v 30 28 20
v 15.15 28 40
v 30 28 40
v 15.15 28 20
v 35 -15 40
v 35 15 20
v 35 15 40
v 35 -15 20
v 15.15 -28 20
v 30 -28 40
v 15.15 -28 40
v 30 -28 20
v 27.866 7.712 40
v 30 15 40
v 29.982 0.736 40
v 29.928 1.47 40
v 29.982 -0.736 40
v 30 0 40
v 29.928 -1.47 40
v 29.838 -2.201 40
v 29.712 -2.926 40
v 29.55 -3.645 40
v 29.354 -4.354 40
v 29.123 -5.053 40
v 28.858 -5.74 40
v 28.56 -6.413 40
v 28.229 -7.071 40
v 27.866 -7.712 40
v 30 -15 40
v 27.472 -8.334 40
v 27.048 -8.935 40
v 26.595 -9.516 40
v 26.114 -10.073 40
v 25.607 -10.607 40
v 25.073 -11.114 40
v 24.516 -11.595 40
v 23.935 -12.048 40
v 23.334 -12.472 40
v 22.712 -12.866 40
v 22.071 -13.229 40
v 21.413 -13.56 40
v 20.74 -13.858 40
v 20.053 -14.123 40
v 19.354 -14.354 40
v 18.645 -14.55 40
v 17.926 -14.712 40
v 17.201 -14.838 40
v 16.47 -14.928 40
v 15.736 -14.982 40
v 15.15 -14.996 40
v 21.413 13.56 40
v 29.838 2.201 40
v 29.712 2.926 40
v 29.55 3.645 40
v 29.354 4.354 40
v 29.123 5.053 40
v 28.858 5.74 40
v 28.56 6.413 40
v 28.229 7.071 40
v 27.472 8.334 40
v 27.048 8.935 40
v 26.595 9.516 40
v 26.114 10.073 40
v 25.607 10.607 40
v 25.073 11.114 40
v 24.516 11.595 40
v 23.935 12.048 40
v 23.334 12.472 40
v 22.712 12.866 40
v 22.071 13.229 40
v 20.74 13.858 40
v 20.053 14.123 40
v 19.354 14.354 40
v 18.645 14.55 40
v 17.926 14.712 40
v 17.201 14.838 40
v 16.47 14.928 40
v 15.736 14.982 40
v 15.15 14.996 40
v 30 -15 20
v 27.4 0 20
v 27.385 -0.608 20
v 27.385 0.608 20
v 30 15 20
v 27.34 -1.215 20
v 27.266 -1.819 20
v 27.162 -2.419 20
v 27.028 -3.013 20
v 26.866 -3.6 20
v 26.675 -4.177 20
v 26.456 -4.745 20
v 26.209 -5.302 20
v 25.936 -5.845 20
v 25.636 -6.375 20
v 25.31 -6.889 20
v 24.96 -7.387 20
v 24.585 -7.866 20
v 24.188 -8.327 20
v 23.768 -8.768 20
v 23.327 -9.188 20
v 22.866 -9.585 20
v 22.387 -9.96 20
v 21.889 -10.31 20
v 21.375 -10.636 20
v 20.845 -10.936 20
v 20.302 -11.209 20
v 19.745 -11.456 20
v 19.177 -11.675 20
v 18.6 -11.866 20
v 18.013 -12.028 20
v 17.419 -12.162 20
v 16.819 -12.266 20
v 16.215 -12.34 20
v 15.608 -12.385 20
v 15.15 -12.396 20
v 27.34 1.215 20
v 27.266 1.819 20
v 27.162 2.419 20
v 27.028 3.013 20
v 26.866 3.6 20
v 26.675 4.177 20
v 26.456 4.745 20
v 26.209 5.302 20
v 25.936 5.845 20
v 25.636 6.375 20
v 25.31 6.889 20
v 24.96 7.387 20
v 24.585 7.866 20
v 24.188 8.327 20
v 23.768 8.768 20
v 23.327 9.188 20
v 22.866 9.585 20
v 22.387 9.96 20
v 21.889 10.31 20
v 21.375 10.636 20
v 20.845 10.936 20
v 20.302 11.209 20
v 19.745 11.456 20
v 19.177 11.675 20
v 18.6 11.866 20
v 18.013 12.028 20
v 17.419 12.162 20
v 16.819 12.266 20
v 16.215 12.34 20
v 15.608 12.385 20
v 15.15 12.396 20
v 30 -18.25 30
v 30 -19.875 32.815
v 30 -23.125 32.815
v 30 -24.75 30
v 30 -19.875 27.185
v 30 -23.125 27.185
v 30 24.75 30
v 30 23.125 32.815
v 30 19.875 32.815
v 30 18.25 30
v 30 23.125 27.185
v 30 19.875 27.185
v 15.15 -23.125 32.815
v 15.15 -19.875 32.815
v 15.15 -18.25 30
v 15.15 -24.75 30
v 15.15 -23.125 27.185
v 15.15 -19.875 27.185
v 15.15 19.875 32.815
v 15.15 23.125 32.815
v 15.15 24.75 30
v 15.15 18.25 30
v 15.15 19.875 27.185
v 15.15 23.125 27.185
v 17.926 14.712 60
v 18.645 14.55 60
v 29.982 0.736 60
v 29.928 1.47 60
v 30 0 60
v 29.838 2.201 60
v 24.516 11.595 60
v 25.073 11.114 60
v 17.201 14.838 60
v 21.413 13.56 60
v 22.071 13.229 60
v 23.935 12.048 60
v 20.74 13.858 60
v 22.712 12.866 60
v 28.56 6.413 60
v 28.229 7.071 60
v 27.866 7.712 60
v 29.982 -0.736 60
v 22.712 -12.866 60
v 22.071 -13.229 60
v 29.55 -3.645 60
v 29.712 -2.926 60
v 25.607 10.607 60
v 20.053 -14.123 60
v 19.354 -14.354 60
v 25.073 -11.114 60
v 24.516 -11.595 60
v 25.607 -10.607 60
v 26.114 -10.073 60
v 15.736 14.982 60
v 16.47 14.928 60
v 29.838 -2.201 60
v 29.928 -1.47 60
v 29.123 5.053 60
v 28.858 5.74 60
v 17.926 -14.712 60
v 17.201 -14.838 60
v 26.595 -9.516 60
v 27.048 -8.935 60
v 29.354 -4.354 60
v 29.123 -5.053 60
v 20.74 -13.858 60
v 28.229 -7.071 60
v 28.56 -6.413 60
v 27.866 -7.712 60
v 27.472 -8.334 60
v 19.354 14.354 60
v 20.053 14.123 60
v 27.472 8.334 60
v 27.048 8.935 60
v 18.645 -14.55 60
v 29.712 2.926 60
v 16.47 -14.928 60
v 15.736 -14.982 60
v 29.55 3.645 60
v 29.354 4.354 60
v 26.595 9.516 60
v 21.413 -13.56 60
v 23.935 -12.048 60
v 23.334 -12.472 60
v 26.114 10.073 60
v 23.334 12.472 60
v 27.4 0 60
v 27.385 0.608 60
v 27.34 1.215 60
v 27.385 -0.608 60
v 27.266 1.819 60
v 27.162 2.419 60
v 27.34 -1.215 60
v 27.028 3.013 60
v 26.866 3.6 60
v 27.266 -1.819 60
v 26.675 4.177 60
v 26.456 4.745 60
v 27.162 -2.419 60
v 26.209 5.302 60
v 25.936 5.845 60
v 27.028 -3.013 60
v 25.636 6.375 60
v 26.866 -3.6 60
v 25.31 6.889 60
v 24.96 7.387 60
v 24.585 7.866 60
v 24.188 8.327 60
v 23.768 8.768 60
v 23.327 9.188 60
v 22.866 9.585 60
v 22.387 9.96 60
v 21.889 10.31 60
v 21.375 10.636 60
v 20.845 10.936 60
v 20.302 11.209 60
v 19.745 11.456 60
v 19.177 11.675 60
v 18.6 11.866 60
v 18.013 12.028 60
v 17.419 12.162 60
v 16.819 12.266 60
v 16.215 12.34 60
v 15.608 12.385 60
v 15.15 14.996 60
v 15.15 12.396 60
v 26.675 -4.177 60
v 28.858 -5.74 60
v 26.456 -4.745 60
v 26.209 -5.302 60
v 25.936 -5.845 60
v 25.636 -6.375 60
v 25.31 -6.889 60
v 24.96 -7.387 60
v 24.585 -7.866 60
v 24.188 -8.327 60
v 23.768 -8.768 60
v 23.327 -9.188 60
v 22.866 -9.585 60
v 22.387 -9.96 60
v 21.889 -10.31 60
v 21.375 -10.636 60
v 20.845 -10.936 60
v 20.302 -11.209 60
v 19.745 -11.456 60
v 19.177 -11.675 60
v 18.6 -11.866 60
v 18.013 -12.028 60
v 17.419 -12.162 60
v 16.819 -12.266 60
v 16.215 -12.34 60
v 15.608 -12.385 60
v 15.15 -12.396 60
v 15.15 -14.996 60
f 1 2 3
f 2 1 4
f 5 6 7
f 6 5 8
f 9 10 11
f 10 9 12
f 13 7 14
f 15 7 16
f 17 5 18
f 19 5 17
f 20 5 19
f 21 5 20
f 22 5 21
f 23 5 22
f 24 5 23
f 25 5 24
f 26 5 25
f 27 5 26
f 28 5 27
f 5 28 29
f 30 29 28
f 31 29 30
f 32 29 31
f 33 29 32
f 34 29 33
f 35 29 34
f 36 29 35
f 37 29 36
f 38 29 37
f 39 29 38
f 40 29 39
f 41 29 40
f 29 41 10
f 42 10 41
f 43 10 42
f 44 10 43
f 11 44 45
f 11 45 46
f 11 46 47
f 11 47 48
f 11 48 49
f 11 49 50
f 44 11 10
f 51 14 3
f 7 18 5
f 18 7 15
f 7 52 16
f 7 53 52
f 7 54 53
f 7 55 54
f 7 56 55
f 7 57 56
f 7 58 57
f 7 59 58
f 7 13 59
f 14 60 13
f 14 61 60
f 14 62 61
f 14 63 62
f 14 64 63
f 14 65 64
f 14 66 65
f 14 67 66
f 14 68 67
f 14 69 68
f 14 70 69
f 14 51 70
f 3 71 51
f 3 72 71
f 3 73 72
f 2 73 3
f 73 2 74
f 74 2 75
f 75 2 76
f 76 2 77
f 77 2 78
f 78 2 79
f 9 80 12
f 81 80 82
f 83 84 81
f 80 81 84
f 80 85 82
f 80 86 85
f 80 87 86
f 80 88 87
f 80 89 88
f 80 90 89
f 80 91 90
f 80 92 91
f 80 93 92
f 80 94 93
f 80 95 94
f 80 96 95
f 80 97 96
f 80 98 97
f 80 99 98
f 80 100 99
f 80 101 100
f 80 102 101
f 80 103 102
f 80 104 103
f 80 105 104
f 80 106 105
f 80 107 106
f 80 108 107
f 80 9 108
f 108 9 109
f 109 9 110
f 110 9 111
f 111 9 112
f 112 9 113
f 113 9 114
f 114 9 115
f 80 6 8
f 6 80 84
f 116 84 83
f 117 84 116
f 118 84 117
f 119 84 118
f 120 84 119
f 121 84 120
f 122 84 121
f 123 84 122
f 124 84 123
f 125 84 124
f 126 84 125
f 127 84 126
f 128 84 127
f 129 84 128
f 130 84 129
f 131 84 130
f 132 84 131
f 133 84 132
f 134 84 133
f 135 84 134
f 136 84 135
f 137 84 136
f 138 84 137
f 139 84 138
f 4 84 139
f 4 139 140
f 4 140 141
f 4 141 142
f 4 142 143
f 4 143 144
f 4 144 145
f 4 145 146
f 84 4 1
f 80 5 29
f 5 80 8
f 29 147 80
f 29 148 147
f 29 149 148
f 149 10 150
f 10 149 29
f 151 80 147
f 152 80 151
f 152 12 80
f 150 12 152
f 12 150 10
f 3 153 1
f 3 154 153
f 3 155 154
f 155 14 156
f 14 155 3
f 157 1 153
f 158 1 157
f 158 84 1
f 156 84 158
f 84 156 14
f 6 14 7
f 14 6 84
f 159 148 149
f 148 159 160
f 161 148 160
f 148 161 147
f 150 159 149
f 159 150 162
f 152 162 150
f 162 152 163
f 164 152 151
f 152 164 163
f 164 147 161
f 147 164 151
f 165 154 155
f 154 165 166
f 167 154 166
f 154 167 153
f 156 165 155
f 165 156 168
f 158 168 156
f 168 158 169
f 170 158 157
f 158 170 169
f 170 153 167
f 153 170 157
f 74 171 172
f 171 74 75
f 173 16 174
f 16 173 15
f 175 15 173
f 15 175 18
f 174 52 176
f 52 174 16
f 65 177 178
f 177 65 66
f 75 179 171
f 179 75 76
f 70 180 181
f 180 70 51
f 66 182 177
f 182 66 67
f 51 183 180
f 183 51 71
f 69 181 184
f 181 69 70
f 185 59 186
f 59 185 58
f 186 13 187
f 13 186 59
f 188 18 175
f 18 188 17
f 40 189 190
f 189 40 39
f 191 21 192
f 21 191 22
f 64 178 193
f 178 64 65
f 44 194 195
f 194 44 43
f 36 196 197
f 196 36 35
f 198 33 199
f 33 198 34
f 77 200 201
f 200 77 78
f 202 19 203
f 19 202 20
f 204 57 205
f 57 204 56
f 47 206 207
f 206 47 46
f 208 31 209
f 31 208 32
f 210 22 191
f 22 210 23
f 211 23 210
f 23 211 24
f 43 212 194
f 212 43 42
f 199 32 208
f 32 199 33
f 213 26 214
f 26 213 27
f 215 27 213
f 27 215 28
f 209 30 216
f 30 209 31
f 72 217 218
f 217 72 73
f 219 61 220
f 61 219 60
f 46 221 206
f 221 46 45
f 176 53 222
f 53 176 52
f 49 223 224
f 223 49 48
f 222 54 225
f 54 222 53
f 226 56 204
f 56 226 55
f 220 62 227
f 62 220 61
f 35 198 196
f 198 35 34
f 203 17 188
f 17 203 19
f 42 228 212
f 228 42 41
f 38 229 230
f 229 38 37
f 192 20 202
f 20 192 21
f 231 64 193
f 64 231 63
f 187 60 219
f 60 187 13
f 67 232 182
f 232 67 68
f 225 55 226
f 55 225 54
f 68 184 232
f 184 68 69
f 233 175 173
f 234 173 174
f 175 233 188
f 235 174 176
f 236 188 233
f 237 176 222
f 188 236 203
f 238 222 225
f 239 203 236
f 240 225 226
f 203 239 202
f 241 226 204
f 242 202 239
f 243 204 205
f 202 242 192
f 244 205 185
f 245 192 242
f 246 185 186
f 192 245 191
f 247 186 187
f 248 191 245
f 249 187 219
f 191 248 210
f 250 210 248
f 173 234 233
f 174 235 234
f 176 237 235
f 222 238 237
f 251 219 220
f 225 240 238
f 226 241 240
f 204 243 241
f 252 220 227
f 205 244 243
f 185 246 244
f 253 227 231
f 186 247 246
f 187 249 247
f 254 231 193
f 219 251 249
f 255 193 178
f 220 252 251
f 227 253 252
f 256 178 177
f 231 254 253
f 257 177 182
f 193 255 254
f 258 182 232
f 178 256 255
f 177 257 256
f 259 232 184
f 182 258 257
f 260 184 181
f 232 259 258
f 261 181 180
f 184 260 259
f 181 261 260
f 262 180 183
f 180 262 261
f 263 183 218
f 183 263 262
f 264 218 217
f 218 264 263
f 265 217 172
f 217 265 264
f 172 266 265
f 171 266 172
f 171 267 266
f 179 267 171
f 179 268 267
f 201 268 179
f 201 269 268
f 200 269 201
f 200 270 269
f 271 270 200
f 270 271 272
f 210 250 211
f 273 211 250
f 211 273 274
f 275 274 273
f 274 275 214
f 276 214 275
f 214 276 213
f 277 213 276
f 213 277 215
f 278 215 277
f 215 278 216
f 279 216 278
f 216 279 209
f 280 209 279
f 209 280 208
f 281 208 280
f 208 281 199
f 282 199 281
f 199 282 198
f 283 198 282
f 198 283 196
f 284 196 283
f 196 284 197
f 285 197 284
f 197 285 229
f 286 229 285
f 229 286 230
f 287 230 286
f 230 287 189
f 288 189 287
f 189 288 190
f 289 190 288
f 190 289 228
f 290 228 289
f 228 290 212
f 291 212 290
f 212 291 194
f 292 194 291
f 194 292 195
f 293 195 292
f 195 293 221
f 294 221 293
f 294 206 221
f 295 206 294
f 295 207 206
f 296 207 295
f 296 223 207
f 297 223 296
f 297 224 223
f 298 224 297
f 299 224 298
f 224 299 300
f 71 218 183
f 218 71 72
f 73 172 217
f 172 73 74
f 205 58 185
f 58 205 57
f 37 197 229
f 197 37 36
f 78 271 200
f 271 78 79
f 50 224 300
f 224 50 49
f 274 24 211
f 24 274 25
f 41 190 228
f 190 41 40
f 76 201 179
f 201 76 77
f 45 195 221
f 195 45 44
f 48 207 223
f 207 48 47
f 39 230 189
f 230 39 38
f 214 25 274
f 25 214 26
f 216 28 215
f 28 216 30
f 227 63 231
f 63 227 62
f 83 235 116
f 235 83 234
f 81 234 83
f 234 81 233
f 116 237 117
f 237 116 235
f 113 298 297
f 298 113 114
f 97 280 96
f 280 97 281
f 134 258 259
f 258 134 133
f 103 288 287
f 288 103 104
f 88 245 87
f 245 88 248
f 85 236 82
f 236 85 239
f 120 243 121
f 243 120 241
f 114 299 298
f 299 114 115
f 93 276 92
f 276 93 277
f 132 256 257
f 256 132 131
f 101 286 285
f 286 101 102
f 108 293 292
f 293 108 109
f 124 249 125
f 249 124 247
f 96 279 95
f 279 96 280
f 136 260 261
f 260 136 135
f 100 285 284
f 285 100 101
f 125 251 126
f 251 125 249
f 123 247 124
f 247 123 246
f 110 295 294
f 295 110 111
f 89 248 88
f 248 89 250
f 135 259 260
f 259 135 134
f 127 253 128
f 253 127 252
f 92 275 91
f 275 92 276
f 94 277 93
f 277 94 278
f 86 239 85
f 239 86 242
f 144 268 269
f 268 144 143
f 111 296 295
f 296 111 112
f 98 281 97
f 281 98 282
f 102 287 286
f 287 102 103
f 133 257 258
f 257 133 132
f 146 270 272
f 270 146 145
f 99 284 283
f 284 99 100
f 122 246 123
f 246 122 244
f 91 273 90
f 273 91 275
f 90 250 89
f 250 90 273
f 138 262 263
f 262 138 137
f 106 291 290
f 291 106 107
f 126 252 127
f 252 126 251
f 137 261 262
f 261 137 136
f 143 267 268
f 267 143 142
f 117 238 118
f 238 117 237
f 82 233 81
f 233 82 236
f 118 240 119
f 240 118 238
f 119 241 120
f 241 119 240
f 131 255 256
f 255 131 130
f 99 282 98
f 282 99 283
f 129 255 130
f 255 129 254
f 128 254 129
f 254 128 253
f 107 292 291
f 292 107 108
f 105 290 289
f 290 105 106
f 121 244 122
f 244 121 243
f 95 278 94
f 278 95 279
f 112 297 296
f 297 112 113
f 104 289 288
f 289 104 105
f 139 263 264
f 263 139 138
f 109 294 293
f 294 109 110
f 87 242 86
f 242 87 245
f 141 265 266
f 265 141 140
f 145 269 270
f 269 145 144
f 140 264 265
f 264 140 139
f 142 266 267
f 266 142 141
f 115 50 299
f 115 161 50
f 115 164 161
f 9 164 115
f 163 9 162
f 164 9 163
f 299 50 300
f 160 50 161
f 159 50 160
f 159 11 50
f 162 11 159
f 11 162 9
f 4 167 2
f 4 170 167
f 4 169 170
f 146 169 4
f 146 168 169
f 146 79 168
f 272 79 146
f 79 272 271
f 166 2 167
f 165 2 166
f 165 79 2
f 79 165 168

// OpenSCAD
// file: rod_support_module.scad
rod_support();

module rod_support(

pD = 12.30, //Diameter of shaft
pH = 15, //Height of shaft
pL = 42, //Length of whole mount
pd = 6.5, //Mount screw diameter

pC = 1, //Bore slit. SHA12=2.5
pL1 = 32, //Mount screw dist
pL2 = 20, //Riser length
pH1 = 29.5, //Total height
pE = 9.5, //Clamp screw distance from shaft center
pM = 3.7, //Clamp screw diameter
__pM2 = 6.9, //Clamp screw head diameter
__pM3 = 15, //Clamp screw length
//__pM4 = 5.54+0.35; //Clamp screw nut flats
__pM5 = 3, //Clamp screw nut thickness
pS = 13.25, //8+5.25; //SHA12=6
pT = 20, //SHA12=14

printchamfer_rise = 0.5,
printchamfer_indent = 0.225, // < Half of outer layer width
bridge_artifact_compensation_indent = 0.5,

mount_screw_slotting = 0,

override_bore = false,
override_bore_size = 12.30

)
{

nut_head_sink = pL2 - __pM3;
//echo(str("nut_head_sink: ",nut_head_sink));

$fn=400;

translate([0,-pL/2,0])
rotate([0,0,90])
rotate([90,0,0])
difference()
{
    cube([pL,pT,pH1]);
    
    //Print chamfer: base
    //translate([-1,-6+printchamfer_indent,-1])
    //cube([pL+2,6,printchamfer_rise+1]);
    
    //Print chamfer base sides
    //translate([(printchamfer_rise+1)/2-1,-1,pS/2])
    //rotate([270,0,0])
    //ramp(printchamfer_rise+1,pS+2,printchamfer_rise+2,1);
    
    translate([pL,0,0])
    mirror([1,0,0])
    translate([(printchamfer_rise+1)/2-1,-1,pS/2])
    rotate([270,0,0])
    ramp(printchamfer_rise+1,pS+2,printchamfer_rise+2,1);
    
    //Bridge artifact compensation
    translate([pL/2,pT/2+mount_screw_slotting+(cos(180/6))*pd/2-0.01,-1])
    rotate([0,0,90])
    {
    translate([bridge_artifact_compensation_indent/2,0,0])
    ramp(bridge_artifact_compensation_indent,pL+2,bridge_artifact_compensation_indent+1,1);
   
    //translate([-bridge_artifact_compensation_indent/2,0,0])
    //ramp(bridge_artifact_compensation_indent,pL+2,1,bridge_artifact_compensation_indent+1);
    }
    
    //Print chamfer: bore
    translate([pL/2,-1,pH])
    rotate([270,0,0])
    cylinder(d=pD+printchamfer_indent,h=1+printchamfer_rise);
    
    //Print chamfer: outer ends of base
    translate([(printchamfer_rise+1)/2-1,(pT+2)/2-1,-1])
    ramp(printchamfer_rise+1,pT+2,printchamfer_rise+2,1);
    
    translate([pL,0,0])
    mirror([1,0,0])
    translate([(printchamfer_rise+1)/2-1,(pT+2)/2-1,-1])
    ramp(printchamfer_rise+1,pT+2,printchamfer_rise+2,1);
    
    if (!override_bore)
    {
        //Center bore
        translate([pL/2,-1,pH])
        rotate([270,0,0])
        cylinder(d=pD,h=pT+2);
        
        //Bore slit
        translate([-pC/2+pL/2,-1,pH])
        cube([pC,pT+2,pH1-pH+1]);
        
        //Bore to slit chamfer
        slit_chamfer_size = 2;
        
        translate([-slit_chamfer_size/2,0,pD/2-1*slit_chamfer_size/3])
        translate([pL/2,pT/2,pH])
        ramp(slit_chamfer_size,pT+2,0,2*slit_chamfer_size/3);
        
        translate([-slit_chamfer_size/2+slit_chamfer_size,0,pD/2-1*slit_chamfer_size/3])
        translate([pL/2,pT/2,pH])
        ramp(slit_chamfer_size,pT+2,2*slit_chamfer_size/3,0);
    }
    else
    {
        //Center bore
        translate([pL/2,-1,pH])
        rotate([270,0,0])
        cylinder(d=override_bore_size,h=pT+2);
    }
    
    //Wing cuts
    translate([-1,-1,pS])
    cube([(pL-pL2)/2+1,pT+2,pH1-pS+1]);
    
    translate([pL-(pL-pL2)/2,-1,pS])
    cube([(pL-pL2)/2+1,pT+2,pH1-pS+1]);
    
    //Clamp screw
    translate([(pL-pL2)/2-1,pT/2,pH+pE])
    rotate([0,90,0])
    //rotate([0,0,90])
    cylinder(d=pM,h=pL2+2,$fn=6);
    
    //Clamp screw countersinks
    translate([(pL-pL2)/2-1,pT/2,pH+pE])
    rotate([0,90,0])
    cylinder(d=__pM2,h=nut_head_sink+1,$fn=6);
    
    translate([(pL-pL2)/2+pL2-nut_head_sink,pT/2,pH+pE])
    rotate([0,90,0])
    cylinder(d=__pM2,h=nut_head_sink+1,$fn=6);
    
    //Clamp screw countersink
    //translate([(pL-pL2)/2-1,pT/2,pH+pE])
    //rotate([0,90,0])
    //cylinder(d=__pM2,h=pL2-__pM3+1,$fn=6);
    
    //Clamp screw nut
    //translate([1+(pL-pL2)/2+pL2,pT/2,pH+pE])
    //rotate([0,270,0])
    //nut_by_flats(f=5.54+0.35,h=__pM5+1,horizontal=false);
    //translate([(pL-pL2)/2+1+pL2,pT/2,pH+pE])
    //rotate([0,90,0])
    //mirror([0,0,1])
    //cylinder(d=__pM2,h=pL2-__pM3+1,$fn=6);
    
    //Mount screws
    translate([(pL-pL2)/4,pT/2,-1])
    cylinder(d=pd,h=pS+2,$fn=6);
    
    translate([3*(pL-pL2)/4+pL2,pT/2,-1])
    cylinder(d=pd,h=pS+2,$fn=6);
    
    //Mount screws: top of slot
    translate([(pL-pL2)/4,pT/2+mount_screw_slotting,-1])
    cylinder(d=pd,h=pS+2,$fn=6);
    
    translate([3*(pL-pL2)/4+pL2,pT/2+mount_screw_slotting,-1])
    cylinder(d=pd,h=pS+2,$fn=6);
    
    //Mount screws: middle of slot
    translate([(pL-pL2)/4,pT/2+mount_screw_slotting/2,pS/2])
    cube([pd,mount_screw_slotting,pS+2],center=true);
    
    translate([3*(pL-pL2)/4+pL2,pT/2+mount_screw_slotting/2,pS/2])
    cube([pd,mount_screw_slotting,pS+2],center=true);
}
}

module ramp(x,y,z1,z2)
{
    rotate([90,0,0])
    translate([0,0,-y/2])
    linear_extrude(height=y)
    {
        polygon(points=[[-x/2,0],[-x/2,z1],[x/2,z2],[x/2,0]]);
    }
}

module nut_by_flats(f,h,horizontal=true,center=false){
    if (center)
    {
        translate([0,0,-h/2])
        {
            cornerdiameter =  (f / 2) / cos (180 / 6);
            cylinder(h = h, r = cornerdiameter, $fn = 6);
            if(horizontal){
                for(i = [1:6]){
                    rotate([0,0,60*i]) translate([-cornerdiameter-0.2,0,0]) rotate([0,0,-45]) cube([2,2,h]);
                }
            }
        }
    }
    else
    {
        cornerdiameter =  (f / 2) / cos (180 / 6);
        cylinder(h = h, r = cornerdiameter, $fn = 6);
        if(horizontal){
            for(i = [1:6]){
                rotate([0,0,60*i]) translate([-cornerdiameter-0.2,0,0]) rotate([0,0,-45]) cube([2,2,h]);
            }
        }

    }
}
// main file
use <rod_support_module.scad>

carriage_cable_anchor(upper=true);
//carriage_cable_anchor(upper=false);

module carriage_cable_anchor(upper)
{
    difference()
    {
        union()
        {
            //rod_support(pS=29, pC=0, pD=1, pL=56, pL2=30, pT=20, pM=0, __pM2=0, __pM3=0, __pM5=0, pH1=32, printchamfer_rise=0, bridge_artifact_compensation_indent=0);

            translate([0,0,20])
            rod_support(pS=30, pC=0, pD=1, pL=56, pL2=30, pT=20, pM=0, __pM2=0, __pM3=0, __pM5=0, pH1=35, printchamfer_rise=0, bridge_artifact_compensation_indent=0);
            
            translate([15,0,40])
            cylinder(h=20,d=30, $fn=128);
        }
        
        translate([15,0,-1])
        cylinder(h=80,d=24.8, $fn=128);
        
        if (upper)
        {
            translate([-1,-30,-1])
            cube([15 +0.15 +1,60,80]);
        }
        else
        {
            translate([15-0.15,-30,-1])
            cube([30 +1,60,80]);
        }
        
        //translate([-50,-50,-1])
        //cube([100,100,21]);
    }
}
